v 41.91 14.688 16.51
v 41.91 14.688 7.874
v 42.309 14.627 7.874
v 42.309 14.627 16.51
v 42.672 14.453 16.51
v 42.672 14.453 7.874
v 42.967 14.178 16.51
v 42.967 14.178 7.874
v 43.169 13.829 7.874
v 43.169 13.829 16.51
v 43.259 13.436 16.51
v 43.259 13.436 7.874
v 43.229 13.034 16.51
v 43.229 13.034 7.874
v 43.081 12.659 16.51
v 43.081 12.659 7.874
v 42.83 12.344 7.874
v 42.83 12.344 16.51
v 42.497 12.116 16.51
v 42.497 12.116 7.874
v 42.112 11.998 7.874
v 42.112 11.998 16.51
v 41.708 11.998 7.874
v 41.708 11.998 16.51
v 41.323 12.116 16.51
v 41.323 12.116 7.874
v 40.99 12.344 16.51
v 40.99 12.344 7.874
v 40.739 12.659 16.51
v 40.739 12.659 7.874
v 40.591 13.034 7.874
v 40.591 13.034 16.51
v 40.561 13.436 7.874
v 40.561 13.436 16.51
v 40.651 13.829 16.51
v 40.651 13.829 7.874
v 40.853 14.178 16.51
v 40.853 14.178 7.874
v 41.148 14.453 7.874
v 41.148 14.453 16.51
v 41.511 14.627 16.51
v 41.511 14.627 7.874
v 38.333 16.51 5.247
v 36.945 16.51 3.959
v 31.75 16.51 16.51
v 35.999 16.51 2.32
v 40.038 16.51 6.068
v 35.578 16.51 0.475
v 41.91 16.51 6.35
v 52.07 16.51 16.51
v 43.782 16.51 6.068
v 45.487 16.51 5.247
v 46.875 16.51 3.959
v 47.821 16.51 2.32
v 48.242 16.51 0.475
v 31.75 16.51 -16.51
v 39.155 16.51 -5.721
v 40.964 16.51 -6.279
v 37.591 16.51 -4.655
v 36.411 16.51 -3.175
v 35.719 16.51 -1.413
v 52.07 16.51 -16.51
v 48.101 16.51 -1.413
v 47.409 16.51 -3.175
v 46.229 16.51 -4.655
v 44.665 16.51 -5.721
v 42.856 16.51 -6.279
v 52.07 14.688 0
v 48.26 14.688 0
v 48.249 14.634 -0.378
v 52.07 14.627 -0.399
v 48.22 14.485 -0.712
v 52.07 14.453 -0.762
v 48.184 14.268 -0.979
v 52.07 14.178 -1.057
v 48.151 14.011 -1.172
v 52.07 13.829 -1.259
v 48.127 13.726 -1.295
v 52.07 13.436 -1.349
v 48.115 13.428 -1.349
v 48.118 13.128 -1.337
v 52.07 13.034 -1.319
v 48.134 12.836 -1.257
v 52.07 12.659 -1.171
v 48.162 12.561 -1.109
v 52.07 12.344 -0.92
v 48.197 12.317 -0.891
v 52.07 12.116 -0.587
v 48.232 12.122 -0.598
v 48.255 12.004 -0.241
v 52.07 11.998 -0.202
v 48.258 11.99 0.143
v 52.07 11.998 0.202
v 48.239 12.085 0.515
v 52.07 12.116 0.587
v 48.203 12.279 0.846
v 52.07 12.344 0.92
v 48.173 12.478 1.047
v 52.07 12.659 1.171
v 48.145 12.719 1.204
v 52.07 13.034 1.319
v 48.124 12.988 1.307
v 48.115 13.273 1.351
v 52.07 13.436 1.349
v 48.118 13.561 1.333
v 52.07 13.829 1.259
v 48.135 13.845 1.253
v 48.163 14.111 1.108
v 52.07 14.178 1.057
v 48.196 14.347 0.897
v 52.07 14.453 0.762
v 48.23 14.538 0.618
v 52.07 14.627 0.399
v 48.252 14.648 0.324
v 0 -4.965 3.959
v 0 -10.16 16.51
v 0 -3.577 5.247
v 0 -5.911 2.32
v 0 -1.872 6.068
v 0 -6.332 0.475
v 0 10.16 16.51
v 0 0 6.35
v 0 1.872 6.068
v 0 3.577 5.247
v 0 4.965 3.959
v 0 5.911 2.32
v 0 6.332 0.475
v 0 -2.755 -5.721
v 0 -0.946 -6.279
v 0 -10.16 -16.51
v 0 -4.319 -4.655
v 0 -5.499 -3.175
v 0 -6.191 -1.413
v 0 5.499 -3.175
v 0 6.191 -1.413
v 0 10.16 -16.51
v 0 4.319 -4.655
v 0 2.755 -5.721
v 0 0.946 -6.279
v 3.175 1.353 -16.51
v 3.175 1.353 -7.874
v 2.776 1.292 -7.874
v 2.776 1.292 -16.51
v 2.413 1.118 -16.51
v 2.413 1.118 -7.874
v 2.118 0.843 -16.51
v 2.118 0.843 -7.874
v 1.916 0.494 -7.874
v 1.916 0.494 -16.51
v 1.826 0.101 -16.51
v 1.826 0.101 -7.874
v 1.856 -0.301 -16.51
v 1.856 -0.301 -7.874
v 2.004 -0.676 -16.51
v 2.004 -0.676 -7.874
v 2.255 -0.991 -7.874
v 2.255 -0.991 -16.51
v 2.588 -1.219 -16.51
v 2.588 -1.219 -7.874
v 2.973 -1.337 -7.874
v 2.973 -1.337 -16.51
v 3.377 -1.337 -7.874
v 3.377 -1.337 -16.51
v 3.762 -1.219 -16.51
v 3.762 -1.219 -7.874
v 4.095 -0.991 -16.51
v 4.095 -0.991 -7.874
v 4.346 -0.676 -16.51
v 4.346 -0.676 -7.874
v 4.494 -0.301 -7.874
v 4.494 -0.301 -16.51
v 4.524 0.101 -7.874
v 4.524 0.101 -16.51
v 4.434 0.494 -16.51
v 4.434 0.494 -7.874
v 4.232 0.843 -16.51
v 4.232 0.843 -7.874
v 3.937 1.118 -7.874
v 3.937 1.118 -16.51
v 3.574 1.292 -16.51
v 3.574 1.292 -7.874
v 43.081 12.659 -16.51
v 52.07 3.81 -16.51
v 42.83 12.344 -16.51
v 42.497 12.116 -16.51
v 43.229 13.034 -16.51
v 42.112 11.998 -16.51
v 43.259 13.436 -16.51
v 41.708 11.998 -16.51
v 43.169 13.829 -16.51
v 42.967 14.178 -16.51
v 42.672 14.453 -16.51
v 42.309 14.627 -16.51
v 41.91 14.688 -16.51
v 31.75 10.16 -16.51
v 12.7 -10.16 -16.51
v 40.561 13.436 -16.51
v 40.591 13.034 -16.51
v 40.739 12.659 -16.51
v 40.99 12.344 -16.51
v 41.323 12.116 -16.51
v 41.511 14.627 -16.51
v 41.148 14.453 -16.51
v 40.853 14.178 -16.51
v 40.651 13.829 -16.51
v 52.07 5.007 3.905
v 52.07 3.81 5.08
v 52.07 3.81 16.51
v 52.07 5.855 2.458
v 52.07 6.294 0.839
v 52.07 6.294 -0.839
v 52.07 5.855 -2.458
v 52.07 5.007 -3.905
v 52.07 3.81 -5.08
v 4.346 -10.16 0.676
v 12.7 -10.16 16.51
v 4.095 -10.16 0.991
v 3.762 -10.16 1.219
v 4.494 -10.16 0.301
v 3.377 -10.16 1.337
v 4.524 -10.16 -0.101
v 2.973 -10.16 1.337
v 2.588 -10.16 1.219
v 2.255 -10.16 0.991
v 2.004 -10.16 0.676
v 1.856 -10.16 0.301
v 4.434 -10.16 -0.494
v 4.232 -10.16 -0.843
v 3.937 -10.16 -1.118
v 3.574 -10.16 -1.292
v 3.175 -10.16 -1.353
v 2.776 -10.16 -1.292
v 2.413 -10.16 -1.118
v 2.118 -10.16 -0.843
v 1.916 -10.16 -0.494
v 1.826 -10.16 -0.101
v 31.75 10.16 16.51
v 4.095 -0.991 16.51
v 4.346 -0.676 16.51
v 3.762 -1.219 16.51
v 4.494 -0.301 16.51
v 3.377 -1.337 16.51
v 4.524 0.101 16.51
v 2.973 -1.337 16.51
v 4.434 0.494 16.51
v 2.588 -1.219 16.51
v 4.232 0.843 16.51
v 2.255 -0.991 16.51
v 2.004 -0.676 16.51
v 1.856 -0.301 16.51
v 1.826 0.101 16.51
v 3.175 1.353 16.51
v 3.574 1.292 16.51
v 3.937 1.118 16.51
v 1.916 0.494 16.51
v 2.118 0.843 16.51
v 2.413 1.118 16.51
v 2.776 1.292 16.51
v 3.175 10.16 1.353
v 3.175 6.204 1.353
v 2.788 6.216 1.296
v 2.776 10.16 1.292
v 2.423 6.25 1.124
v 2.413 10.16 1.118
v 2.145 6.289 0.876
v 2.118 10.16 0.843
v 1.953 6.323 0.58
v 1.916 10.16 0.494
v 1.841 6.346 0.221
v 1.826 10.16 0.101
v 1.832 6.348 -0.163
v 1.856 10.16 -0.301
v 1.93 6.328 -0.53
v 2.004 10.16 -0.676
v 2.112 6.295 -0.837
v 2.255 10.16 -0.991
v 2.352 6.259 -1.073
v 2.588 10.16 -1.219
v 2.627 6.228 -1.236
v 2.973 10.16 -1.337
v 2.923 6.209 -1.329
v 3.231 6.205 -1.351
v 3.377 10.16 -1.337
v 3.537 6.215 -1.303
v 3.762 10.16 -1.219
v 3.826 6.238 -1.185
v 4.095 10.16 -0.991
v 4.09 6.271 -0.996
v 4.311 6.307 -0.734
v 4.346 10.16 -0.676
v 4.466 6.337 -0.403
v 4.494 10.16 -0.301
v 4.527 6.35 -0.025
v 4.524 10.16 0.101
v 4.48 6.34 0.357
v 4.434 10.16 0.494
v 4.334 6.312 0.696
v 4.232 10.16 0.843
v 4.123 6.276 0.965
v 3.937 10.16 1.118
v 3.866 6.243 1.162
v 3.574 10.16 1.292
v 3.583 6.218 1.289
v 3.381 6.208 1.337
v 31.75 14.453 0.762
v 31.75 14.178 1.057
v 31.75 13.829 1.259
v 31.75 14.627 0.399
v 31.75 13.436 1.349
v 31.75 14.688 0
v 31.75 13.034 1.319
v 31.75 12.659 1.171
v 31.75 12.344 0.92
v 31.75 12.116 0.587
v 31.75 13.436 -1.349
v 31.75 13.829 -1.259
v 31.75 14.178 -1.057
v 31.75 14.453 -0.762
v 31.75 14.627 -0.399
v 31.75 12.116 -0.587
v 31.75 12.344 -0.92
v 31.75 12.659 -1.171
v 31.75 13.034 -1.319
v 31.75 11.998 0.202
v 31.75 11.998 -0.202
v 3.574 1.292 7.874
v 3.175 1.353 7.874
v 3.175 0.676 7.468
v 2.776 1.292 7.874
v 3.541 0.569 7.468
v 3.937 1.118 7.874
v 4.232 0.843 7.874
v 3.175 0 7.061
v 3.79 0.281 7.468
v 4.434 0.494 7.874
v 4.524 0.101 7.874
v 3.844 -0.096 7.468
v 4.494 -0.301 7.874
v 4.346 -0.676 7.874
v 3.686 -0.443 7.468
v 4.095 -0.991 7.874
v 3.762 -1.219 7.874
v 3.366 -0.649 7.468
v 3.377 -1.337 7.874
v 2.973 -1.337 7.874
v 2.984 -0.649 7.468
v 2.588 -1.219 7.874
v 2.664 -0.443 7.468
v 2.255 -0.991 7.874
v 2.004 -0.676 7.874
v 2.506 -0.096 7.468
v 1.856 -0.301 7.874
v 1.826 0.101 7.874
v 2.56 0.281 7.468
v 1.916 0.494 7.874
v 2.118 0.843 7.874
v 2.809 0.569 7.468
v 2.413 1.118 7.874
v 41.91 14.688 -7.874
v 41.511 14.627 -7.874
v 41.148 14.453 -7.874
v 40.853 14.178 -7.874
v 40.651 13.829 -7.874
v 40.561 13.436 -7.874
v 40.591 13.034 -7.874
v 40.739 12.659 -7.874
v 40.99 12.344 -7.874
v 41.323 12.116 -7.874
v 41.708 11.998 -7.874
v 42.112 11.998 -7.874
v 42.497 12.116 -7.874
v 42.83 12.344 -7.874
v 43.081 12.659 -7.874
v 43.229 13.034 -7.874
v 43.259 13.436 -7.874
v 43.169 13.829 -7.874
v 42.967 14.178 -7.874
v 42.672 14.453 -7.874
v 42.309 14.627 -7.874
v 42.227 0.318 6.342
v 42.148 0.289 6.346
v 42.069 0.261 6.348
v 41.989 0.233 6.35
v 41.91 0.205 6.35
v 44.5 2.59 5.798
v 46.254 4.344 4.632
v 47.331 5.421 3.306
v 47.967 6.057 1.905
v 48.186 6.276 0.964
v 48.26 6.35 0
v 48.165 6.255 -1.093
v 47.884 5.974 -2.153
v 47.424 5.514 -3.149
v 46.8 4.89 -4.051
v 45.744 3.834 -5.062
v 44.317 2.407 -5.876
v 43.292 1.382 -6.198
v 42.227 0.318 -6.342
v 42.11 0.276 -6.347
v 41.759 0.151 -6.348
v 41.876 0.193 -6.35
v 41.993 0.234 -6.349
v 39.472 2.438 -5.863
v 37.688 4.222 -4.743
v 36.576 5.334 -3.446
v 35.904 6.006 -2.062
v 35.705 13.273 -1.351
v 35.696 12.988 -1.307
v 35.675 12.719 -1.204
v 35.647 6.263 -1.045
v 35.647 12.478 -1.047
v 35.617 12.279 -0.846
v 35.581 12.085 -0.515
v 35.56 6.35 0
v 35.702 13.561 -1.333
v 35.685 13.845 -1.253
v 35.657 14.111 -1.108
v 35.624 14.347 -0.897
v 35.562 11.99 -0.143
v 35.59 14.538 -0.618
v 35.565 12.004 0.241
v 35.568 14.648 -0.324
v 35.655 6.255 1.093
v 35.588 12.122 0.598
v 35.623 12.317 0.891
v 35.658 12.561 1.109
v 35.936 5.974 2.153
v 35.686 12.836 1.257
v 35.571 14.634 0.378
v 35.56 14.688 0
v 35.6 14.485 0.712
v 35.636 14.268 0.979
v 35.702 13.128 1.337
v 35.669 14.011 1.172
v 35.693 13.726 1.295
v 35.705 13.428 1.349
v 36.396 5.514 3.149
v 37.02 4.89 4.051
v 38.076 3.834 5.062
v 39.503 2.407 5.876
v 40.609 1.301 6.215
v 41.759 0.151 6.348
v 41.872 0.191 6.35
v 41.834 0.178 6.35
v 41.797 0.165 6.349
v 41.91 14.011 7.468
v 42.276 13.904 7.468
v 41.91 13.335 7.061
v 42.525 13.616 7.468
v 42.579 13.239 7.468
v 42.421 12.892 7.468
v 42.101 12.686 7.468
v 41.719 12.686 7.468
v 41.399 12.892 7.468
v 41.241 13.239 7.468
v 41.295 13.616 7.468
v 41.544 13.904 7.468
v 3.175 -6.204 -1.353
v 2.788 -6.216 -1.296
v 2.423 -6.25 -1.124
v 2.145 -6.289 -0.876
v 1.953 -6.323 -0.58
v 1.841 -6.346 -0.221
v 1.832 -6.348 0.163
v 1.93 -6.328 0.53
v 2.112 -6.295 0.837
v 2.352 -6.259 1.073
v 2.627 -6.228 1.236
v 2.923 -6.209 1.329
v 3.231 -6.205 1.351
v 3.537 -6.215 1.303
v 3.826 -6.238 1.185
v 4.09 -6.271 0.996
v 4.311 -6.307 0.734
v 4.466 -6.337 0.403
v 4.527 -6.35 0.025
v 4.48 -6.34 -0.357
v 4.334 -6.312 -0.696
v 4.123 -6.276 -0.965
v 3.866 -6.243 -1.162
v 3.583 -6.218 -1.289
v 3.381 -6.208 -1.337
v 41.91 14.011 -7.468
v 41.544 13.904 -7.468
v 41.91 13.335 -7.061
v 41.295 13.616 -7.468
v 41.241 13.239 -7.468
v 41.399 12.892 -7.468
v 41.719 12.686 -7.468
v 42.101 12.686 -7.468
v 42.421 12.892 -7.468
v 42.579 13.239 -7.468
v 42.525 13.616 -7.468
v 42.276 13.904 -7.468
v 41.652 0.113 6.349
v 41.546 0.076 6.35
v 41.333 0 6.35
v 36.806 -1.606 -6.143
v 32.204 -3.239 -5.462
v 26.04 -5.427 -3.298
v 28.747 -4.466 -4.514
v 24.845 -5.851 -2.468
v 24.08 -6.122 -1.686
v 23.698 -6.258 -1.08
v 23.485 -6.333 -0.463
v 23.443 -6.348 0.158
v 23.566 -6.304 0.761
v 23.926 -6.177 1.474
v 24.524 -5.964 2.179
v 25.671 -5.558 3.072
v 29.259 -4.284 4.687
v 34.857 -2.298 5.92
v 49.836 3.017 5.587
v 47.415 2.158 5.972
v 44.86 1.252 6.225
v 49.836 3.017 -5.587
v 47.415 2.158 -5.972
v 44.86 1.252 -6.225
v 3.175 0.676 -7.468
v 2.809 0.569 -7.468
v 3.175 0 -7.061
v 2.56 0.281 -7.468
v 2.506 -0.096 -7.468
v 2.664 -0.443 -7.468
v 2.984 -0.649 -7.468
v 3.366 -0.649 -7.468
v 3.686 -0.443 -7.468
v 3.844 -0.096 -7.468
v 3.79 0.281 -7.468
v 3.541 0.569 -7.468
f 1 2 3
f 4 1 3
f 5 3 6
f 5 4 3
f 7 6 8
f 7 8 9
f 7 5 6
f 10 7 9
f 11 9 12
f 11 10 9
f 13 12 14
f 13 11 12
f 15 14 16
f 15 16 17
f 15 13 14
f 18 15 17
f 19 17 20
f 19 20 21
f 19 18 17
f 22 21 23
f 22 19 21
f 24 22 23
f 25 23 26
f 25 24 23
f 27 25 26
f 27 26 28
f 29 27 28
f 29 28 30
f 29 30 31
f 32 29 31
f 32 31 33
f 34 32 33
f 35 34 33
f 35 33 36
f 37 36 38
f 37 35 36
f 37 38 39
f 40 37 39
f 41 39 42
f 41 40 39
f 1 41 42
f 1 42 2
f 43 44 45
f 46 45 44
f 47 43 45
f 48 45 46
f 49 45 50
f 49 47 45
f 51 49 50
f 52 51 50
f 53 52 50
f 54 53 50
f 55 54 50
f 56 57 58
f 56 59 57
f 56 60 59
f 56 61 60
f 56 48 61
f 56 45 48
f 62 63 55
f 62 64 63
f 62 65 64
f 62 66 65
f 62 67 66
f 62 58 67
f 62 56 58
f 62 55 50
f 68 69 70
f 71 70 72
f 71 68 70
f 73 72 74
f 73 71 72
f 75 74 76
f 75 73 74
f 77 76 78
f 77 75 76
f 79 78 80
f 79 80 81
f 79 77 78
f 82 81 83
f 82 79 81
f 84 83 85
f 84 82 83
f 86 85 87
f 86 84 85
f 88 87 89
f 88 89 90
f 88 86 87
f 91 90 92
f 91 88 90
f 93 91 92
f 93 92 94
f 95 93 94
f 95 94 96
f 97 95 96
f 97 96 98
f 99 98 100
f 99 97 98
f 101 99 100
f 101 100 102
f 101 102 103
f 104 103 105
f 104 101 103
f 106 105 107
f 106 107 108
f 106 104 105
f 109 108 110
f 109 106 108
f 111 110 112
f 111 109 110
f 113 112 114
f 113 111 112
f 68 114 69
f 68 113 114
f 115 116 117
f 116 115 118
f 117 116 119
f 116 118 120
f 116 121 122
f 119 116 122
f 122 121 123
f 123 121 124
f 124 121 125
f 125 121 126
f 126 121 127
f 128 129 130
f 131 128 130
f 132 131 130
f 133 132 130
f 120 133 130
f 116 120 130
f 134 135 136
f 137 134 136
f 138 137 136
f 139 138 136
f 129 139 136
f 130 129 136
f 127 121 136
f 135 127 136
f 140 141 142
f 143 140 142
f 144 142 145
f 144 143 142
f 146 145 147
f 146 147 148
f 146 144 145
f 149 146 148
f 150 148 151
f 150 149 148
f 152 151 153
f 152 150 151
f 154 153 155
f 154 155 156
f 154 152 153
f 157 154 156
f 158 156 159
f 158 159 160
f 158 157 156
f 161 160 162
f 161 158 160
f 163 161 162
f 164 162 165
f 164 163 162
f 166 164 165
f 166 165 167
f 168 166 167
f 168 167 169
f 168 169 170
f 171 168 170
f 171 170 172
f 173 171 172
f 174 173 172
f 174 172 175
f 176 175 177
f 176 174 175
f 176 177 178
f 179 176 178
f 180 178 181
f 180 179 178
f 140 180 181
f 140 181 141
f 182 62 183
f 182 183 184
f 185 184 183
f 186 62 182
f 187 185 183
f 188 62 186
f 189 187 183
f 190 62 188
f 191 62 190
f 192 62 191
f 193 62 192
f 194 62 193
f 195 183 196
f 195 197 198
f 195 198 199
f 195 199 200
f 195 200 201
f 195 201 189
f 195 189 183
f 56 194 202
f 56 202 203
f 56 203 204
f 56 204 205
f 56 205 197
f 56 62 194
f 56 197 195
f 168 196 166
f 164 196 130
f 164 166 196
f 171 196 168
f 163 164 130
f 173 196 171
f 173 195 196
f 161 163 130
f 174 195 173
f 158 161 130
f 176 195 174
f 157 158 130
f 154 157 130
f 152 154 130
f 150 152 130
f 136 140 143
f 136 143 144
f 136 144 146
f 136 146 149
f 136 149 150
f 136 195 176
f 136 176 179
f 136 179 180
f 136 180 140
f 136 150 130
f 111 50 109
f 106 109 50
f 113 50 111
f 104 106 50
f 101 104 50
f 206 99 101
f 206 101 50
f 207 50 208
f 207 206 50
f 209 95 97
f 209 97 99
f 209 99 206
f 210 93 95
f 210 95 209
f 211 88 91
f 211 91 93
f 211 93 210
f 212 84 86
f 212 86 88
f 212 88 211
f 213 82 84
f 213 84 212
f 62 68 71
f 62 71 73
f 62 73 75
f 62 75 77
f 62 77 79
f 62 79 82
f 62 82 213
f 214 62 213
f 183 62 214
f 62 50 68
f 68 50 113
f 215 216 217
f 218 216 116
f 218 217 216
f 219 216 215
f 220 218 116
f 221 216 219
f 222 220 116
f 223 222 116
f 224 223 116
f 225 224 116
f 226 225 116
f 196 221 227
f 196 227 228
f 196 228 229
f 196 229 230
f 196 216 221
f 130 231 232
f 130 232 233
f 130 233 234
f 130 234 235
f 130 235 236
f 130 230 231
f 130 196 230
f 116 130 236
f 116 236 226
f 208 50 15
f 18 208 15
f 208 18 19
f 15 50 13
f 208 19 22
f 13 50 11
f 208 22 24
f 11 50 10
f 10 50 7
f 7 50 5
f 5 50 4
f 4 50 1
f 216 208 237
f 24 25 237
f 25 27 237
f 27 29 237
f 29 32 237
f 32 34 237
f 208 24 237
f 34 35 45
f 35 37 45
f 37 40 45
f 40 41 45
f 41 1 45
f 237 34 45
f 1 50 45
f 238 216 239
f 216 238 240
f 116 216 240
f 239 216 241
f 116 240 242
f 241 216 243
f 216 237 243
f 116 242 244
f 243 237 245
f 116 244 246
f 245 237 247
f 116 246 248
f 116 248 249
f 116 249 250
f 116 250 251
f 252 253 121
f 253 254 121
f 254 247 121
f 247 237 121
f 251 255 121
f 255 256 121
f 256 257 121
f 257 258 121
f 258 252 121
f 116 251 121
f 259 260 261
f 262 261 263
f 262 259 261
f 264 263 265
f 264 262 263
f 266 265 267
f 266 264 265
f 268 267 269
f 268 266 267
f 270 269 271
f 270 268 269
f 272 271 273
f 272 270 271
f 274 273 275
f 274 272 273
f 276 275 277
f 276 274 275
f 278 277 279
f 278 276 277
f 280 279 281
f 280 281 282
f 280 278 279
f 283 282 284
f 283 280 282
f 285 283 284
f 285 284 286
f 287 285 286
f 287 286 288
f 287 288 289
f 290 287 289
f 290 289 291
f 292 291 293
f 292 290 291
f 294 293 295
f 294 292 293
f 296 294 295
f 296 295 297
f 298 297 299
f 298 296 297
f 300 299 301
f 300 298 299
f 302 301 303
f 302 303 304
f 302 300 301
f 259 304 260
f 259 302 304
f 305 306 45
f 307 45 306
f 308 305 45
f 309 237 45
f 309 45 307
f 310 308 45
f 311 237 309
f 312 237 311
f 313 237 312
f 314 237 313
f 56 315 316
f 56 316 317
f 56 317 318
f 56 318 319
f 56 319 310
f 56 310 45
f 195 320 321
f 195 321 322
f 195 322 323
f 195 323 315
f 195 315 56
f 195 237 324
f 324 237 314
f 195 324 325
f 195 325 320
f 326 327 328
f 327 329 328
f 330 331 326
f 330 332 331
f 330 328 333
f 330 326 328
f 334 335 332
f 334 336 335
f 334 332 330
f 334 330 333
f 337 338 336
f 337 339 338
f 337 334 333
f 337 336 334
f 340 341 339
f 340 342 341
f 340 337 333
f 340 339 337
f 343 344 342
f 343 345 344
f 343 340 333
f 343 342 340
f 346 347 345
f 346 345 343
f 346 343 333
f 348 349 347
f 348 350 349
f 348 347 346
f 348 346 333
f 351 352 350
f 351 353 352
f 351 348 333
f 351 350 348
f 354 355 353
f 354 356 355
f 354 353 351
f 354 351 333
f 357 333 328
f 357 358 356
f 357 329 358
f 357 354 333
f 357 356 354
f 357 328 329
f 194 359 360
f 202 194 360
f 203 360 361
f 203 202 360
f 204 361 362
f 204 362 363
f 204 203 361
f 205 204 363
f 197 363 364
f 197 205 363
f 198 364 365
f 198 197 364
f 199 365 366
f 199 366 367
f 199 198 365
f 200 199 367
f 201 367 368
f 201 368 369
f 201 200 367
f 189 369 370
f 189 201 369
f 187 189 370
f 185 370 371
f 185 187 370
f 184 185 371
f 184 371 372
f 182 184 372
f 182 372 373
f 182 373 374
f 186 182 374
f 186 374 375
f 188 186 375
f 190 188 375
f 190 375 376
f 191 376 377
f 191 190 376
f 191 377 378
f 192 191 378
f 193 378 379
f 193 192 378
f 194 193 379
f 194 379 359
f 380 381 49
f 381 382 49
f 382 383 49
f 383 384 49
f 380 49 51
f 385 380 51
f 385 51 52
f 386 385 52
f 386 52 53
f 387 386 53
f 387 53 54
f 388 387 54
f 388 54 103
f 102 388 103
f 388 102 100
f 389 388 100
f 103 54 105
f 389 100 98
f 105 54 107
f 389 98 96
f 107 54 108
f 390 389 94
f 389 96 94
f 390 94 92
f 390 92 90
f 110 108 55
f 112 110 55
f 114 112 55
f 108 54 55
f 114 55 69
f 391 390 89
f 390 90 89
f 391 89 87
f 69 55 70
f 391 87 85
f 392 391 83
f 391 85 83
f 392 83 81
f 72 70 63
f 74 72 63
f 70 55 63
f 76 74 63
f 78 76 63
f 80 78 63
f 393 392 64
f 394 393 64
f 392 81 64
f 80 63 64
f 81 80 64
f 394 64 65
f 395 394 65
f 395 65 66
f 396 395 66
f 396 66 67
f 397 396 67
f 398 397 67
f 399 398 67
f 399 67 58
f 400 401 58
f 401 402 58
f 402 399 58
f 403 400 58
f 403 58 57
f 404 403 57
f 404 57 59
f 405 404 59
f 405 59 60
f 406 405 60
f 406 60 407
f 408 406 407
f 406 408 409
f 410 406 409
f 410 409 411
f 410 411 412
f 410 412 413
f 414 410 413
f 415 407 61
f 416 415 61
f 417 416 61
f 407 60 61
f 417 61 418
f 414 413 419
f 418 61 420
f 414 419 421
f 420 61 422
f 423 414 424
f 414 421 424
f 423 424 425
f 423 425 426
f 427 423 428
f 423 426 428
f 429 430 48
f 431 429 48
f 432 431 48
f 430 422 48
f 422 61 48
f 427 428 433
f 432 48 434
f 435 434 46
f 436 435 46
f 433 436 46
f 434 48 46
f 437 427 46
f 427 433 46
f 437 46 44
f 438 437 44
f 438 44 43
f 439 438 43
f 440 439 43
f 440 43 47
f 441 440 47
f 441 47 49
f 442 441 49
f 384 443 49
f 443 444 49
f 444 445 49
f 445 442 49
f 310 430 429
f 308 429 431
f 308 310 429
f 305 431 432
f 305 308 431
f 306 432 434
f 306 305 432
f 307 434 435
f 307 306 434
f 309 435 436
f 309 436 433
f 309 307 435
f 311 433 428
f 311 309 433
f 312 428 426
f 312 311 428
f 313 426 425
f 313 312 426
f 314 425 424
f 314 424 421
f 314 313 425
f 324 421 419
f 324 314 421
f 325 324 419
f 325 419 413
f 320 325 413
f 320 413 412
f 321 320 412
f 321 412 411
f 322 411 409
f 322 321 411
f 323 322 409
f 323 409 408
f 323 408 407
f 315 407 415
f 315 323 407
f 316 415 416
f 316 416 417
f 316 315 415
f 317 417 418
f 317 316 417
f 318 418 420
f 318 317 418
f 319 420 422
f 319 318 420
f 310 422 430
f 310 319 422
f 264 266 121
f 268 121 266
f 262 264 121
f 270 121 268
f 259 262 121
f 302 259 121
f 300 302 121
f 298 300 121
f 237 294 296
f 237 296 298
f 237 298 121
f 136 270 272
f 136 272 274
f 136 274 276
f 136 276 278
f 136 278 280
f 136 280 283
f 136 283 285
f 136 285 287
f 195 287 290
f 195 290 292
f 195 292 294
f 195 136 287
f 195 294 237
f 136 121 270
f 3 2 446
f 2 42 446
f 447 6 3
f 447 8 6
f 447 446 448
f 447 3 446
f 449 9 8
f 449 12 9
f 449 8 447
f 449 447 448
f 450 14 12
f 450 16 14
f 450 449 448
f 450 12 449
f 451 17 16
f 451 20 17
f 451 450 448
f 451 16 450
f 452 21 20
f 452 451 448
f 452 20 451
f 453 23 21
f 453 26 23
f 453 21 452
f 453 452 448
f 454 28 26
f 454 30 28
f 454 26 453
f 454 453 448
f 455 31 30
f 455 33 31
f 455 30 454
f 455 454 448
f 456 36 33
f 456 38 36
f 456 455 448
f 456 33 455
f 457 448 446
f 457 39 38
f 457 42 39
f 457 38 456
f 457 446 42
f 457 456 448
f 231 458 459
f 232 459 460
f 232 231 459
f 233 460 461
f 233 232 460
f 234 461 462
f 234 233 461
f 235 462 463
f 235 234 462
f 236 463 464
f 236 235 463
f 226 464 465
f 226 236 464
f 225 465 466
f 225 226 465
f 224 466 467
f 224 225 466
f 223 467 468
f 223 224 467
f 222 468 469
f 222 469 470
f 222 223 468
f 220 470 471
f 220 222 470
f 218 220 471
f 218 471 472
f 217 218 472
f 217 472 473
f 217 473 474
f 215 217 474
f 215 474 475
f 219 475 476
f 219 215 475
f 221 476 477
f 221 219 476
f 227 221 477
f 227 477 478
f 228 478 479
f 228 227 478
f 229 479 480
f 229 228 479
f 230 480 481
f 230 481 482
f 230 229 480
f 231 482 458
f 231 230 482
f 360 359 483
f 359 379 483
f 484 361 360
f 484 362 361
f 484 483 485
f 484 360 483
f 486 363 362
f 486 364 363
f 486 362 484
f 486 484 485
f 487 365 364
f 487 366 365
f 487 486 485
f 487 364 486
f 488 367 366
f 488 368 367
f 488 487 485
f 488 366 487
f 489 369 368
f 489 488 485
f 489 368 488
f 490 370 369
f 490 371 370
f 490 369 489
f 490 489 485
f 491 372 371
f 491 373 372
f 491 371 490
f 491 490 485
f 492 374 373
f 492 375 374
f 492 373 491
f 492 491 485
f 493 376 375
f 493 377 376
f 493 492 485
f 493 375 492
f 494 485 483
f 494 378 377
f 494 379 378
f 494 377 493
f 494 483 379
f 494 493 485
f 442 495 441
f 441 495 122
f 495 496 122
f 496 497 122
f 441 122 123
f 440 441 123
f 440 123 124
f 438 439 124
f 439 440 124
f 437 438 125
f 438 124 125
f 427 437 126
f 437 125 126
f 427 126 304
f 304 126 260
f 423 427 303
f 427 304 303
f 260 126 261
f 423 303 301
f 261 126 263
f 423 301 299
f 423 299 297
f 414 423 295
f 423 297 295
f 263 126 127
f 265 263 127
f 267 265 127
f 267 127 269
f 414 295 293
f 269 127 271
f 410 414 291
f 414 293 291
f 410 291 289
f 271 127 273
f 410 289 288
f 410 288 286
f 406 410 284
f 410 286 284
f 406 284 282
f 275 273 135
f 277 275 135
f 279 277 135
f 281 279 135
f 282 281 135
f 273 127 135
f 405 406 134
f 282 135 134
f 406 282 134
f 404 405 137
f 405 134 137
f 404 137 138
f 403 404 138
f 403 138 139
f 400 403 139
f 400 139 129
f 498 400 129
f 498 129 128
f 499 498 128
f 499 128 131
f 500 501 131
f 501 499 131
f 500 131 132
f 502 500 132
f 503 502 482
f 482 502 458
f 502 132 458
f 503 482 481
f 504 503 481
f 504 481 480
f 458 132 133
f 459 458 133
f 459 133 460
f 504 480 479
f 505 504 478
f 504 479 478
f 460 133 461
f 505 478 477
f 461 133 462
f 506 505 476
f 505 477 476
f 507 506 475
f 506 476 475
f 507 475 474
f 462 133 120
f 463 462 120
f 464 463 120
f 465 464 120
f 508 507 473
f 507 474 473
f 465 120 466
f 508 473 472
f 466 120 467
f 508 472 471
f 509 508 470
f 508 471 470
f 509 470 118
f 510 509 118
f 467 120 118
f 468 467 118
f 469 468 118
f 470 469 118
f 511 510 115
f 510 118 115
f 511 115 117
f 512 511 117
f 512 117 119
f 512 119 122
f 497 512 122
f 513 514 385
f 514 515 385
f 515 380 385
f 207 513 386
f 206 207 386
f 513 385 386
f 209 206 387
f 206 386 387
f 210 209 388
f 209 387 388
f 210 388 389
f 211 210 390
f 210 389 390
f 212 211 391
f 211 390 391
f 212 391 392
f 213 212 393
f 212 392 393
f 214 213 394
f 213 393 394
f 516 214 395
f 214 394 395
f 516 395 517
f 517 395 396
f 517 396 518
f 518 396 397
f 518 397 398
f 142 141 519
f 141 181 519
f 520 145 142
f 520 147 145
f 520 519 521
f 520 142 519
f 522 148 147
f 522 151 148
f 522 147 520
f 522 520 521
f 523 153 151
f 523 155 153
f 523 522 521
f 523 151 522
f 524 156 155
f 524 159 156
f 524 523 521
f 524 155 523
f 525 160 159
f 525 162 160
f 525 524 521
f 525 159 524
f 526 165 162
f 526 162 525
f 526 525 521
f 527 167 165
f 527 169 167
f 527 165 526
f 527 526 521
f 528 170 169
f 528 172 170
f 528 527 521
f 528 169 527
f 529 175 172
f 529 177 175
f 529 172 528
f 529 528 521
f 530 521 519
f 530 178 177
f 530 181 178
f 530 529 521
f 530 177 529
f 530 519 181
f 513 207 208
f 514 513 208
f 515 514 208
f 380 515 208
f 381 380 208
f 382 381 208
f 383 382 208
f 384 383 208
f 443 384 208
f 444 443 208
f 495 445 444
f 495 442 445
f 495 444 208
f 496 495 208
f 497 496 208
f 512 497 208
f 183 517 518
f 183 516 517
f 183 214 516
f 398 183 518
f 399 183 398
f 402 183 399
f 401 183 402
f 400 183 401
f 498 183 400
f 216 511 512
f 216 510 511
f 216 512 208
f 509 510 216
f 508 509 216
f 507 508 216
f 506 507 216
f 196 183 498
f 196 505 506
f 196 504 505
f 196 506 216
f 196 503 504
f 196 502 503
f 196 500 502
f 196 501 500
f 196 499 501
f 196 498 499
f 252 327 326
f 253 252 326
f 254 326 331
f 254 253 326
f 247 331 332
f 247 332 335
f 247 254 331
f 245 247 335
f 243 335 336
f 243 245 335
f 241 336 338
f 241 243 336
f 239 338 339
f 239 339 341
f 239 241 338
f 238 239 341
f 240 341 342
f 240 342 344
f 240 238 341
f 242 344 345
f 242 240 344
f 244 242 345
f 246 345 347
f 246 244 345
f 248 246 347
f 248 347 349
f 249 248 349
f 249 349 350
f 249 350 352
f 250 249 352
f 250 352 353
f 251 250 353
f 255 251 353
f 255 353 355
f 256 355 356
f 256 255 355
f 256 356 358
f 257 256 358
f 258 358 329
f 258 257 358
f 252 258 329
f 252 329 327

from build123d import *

# Parameters (mm, degrees)
SKETCH1_W           = 33.02
SKETCH1_H           = 20.32
BOSS_EXTRUDE1_DEPTH = 6.35
SKETCH2_W           = 20.32
SKETCH2_H           = 33.02
BOSS_EXTRUDE2_DEPTH = 6.35
BOSS_EXTRUDE3_DEPTH = 33.02
SKETCH6_R           = 6.35
CUT_EXTRUDE1_DEPTH  = 61.787777554
SKETCH7_R           = 6.35
CUT_EXTRUDE2_DEPTH  = 58.065270644


with BuildPart() as part:
    # Sketch1 → Boss-Extrude1 (new body)
    with BuildSketch(Plane(origin=(0, 0, 0), x_dir=(0, 0, -1), z_dir=(1, 0, 0))):
        Rectangle(SKETCH1_W, SKETCH1_H)
    extrude(amount=BOSS_EXTRUDE1_DEPTH)

    # Sketch5 → #6-32 Tapped Hole1 (revolve, cut)
    with BuildSketch(Plane(origin=(3.175, 0, -16.51), x_dir=(0, 1, 0), z_dir=(1, 0, 0))):
        Polygon((0, 0), (0, 9.44869403), (1.35255, 8.636), (1.35255, 0), align=None)
    revolve(axis=Axis((3.175, 0, -22.86), (0, 0, 1)), mode=Mode.SUBTRACT)

    # Sketch5 at point 2 (carried to point 2, square into its face) → #6-32 Tapped Hole1 at 2 (revolve, cut)
    with BuildSketch(Plane(origin=(3.175, 10.16, 0), x_dir=(0, 0, 1), z_dir=(1, 0, 0))):
        Polygon((0, 0), (0, 9.44869403), (1.35255, 8.636), (1.35255, 0), align=None)
    revolve(axis=Axis((3.175, 16.51, 0), (0, -1, 0)), mode=Mode.SUBTRACT)

    # Sketch5 at point 7 (carried to point 7, square into its face) → #6-32 Tapped Hole1 at 7 (revolve, cut)
    with BuildSketch(Plane(origin=(3.175, 0, 16.51), x_dir=(0, 1, 0), z_dir=(-1, 0, 0))):
        Polygon((0, 0), (0, 9.44869403), (1.35255, 8.636), (1.35255, 0), align=None)
    revolve(axis=Axis((3.175, 0, 22.86), (0, 0, -1)), mode=Mode.SUBTRACT)

    # Sketch5 at point 8 (carried to point 8, square into its face) → #6-32 Tapped Hole1 at 8 (revolve, cut)
    with BuildSketch(Plane(origin=(3.175, -10.16, 0), x_dir=(0, 0, -1), z_dir=(1, 0, 0))):
        Polygon((0, 0), (0, 9.44869403), (1.35255, 8.636), (1.35255, 0), align=None)
    revolve(axis=Axis((3.175, -16.51, 0), (0, 1, 0)), mode=Mode.SUBTRACT)



with BuildPart() as body_2:
    # Sketch2 → Boss-Extrude2 (new body)
    with BuildSketch(Plane(origin=(0, 10.16, 0), x_dir=(1, 0, 0), z_dir=(0, 1, 0))):
        with Locations((41.91, 0)):
            Rectangle(SKETCH2_W, SKETCH2_H)
    extrude(amount=BOSS_EXTRUDE2_DEPTH)

    # Sketch5 at point 3 (carried to point 3, square into its face) → #6-32 Tapped Hole1 at 3 (revolve, cut)
    with BuildSketch(Plane(origin=(31.75, 13.335, 0), x_dir=(0, 1, 0), z_dir=(0, 0, -1))):
        Polygon((0, 0), (0, 9.44869403), (1.35255, 8.636), (1.35255, 0), align=None)
    revolve(axis=Axis((25.4, 13.335, 0), (1, 0, 0)), mode=Mode.SUBTRACT)

    # Sketch5 at point 4 (carried to point 4, square into its face) → #6-32 Tapped Hole1 at 4 (revolve, cut)
    with BuildSketch(Plane(origin=(41.91, 13.335, -16.51), x_dir=(0, 1, 0), z_dir=(1, 0, 0))):
        Polygon((0, 0), (0, 9.44869403), (1.35255, 8.636), (1.35255, 0), align=None)
    revolve(axis=Axis((41.91, 13.335, -22.86), (0, 0, 1)), mode=Mode.SUBTRACT)

    # Sketch5 at point 5 (carried to point 5, square into its face) → #6-32 Tapped Hole1 at 5 (revolve, cut)
    with BuildSketch(Plane(origin=(41.91, 13.335, 16.51), x_dir=(0, 1, 0), z_dir=(-1, 0, 0))):
        Polygon((0, 0), (0, 9.44869403), (1.35255, 8.636), (1.35255, 0), align=None)
    revolve(axis=Axis((41.91, 13.335, 22.86), (0, 0, -1)), mode=Mode.SUBTRACT)

    # Sketch5 at point 6 (carried to point 6, square into its face) → #6-32 Tapped Hole1 at 6 (revolve, cut)
    with BuildSketch(Plane(origin=(52.07, 13.335, 0), x_dir=(0, 1, 0), z_dir=(0, 0, 1))):
        Polygon((0, 0), (0, 9.44869403), (1.35255, 8.636), (1.35255, 0), align=None)
    revolve(axis=Axis((58.42, 13.335, 0), (-1, 0, 0)), mode=Mode.SUBTRACT)


with BuildPart() as part_1:
    add(part.part)

    add(body_2.part)  # Boss-Extrude3 merges body 2
    # Sketch4 → Boss-Extrude3 (add, through all)
    with BuildSketch(Plane.XY.offset(-16.51)):
        Polygon((52.07, 10.16), (52.07, 3.81), (12.7, -10.16), (6.35, -10.16), (6.35, 10.16), align=None)
    extrude(amount=BOSS_EXTRUDE3_DEPTH)

    # Sketch6 → Cut-Extrude1 (cut, through all)
    with BuildSketch(Plane(origin=(0, 16.51, 0), x_dir=(1, 0, 0), z_dir=(0, 1, 0))):
        with Locations(Location((41.91, 0, 0), (0, 0, 270))):
            Circle(SKETCH6_R)
    extrude(amount=-CUT_EXTRUDE1_DEPTH, mode=Mode.SUBTRACT)

    # Sketch7 → Cut-Extrude2 (cut, through all)
    with BuildSketch(Plane.ZY):
        Circle(SKETCH7_R)
    extrude(amount=-CUT_EXTRUDE2_DEPTH, mode=Mode.SUBTRACT)


solid = part_1.part
